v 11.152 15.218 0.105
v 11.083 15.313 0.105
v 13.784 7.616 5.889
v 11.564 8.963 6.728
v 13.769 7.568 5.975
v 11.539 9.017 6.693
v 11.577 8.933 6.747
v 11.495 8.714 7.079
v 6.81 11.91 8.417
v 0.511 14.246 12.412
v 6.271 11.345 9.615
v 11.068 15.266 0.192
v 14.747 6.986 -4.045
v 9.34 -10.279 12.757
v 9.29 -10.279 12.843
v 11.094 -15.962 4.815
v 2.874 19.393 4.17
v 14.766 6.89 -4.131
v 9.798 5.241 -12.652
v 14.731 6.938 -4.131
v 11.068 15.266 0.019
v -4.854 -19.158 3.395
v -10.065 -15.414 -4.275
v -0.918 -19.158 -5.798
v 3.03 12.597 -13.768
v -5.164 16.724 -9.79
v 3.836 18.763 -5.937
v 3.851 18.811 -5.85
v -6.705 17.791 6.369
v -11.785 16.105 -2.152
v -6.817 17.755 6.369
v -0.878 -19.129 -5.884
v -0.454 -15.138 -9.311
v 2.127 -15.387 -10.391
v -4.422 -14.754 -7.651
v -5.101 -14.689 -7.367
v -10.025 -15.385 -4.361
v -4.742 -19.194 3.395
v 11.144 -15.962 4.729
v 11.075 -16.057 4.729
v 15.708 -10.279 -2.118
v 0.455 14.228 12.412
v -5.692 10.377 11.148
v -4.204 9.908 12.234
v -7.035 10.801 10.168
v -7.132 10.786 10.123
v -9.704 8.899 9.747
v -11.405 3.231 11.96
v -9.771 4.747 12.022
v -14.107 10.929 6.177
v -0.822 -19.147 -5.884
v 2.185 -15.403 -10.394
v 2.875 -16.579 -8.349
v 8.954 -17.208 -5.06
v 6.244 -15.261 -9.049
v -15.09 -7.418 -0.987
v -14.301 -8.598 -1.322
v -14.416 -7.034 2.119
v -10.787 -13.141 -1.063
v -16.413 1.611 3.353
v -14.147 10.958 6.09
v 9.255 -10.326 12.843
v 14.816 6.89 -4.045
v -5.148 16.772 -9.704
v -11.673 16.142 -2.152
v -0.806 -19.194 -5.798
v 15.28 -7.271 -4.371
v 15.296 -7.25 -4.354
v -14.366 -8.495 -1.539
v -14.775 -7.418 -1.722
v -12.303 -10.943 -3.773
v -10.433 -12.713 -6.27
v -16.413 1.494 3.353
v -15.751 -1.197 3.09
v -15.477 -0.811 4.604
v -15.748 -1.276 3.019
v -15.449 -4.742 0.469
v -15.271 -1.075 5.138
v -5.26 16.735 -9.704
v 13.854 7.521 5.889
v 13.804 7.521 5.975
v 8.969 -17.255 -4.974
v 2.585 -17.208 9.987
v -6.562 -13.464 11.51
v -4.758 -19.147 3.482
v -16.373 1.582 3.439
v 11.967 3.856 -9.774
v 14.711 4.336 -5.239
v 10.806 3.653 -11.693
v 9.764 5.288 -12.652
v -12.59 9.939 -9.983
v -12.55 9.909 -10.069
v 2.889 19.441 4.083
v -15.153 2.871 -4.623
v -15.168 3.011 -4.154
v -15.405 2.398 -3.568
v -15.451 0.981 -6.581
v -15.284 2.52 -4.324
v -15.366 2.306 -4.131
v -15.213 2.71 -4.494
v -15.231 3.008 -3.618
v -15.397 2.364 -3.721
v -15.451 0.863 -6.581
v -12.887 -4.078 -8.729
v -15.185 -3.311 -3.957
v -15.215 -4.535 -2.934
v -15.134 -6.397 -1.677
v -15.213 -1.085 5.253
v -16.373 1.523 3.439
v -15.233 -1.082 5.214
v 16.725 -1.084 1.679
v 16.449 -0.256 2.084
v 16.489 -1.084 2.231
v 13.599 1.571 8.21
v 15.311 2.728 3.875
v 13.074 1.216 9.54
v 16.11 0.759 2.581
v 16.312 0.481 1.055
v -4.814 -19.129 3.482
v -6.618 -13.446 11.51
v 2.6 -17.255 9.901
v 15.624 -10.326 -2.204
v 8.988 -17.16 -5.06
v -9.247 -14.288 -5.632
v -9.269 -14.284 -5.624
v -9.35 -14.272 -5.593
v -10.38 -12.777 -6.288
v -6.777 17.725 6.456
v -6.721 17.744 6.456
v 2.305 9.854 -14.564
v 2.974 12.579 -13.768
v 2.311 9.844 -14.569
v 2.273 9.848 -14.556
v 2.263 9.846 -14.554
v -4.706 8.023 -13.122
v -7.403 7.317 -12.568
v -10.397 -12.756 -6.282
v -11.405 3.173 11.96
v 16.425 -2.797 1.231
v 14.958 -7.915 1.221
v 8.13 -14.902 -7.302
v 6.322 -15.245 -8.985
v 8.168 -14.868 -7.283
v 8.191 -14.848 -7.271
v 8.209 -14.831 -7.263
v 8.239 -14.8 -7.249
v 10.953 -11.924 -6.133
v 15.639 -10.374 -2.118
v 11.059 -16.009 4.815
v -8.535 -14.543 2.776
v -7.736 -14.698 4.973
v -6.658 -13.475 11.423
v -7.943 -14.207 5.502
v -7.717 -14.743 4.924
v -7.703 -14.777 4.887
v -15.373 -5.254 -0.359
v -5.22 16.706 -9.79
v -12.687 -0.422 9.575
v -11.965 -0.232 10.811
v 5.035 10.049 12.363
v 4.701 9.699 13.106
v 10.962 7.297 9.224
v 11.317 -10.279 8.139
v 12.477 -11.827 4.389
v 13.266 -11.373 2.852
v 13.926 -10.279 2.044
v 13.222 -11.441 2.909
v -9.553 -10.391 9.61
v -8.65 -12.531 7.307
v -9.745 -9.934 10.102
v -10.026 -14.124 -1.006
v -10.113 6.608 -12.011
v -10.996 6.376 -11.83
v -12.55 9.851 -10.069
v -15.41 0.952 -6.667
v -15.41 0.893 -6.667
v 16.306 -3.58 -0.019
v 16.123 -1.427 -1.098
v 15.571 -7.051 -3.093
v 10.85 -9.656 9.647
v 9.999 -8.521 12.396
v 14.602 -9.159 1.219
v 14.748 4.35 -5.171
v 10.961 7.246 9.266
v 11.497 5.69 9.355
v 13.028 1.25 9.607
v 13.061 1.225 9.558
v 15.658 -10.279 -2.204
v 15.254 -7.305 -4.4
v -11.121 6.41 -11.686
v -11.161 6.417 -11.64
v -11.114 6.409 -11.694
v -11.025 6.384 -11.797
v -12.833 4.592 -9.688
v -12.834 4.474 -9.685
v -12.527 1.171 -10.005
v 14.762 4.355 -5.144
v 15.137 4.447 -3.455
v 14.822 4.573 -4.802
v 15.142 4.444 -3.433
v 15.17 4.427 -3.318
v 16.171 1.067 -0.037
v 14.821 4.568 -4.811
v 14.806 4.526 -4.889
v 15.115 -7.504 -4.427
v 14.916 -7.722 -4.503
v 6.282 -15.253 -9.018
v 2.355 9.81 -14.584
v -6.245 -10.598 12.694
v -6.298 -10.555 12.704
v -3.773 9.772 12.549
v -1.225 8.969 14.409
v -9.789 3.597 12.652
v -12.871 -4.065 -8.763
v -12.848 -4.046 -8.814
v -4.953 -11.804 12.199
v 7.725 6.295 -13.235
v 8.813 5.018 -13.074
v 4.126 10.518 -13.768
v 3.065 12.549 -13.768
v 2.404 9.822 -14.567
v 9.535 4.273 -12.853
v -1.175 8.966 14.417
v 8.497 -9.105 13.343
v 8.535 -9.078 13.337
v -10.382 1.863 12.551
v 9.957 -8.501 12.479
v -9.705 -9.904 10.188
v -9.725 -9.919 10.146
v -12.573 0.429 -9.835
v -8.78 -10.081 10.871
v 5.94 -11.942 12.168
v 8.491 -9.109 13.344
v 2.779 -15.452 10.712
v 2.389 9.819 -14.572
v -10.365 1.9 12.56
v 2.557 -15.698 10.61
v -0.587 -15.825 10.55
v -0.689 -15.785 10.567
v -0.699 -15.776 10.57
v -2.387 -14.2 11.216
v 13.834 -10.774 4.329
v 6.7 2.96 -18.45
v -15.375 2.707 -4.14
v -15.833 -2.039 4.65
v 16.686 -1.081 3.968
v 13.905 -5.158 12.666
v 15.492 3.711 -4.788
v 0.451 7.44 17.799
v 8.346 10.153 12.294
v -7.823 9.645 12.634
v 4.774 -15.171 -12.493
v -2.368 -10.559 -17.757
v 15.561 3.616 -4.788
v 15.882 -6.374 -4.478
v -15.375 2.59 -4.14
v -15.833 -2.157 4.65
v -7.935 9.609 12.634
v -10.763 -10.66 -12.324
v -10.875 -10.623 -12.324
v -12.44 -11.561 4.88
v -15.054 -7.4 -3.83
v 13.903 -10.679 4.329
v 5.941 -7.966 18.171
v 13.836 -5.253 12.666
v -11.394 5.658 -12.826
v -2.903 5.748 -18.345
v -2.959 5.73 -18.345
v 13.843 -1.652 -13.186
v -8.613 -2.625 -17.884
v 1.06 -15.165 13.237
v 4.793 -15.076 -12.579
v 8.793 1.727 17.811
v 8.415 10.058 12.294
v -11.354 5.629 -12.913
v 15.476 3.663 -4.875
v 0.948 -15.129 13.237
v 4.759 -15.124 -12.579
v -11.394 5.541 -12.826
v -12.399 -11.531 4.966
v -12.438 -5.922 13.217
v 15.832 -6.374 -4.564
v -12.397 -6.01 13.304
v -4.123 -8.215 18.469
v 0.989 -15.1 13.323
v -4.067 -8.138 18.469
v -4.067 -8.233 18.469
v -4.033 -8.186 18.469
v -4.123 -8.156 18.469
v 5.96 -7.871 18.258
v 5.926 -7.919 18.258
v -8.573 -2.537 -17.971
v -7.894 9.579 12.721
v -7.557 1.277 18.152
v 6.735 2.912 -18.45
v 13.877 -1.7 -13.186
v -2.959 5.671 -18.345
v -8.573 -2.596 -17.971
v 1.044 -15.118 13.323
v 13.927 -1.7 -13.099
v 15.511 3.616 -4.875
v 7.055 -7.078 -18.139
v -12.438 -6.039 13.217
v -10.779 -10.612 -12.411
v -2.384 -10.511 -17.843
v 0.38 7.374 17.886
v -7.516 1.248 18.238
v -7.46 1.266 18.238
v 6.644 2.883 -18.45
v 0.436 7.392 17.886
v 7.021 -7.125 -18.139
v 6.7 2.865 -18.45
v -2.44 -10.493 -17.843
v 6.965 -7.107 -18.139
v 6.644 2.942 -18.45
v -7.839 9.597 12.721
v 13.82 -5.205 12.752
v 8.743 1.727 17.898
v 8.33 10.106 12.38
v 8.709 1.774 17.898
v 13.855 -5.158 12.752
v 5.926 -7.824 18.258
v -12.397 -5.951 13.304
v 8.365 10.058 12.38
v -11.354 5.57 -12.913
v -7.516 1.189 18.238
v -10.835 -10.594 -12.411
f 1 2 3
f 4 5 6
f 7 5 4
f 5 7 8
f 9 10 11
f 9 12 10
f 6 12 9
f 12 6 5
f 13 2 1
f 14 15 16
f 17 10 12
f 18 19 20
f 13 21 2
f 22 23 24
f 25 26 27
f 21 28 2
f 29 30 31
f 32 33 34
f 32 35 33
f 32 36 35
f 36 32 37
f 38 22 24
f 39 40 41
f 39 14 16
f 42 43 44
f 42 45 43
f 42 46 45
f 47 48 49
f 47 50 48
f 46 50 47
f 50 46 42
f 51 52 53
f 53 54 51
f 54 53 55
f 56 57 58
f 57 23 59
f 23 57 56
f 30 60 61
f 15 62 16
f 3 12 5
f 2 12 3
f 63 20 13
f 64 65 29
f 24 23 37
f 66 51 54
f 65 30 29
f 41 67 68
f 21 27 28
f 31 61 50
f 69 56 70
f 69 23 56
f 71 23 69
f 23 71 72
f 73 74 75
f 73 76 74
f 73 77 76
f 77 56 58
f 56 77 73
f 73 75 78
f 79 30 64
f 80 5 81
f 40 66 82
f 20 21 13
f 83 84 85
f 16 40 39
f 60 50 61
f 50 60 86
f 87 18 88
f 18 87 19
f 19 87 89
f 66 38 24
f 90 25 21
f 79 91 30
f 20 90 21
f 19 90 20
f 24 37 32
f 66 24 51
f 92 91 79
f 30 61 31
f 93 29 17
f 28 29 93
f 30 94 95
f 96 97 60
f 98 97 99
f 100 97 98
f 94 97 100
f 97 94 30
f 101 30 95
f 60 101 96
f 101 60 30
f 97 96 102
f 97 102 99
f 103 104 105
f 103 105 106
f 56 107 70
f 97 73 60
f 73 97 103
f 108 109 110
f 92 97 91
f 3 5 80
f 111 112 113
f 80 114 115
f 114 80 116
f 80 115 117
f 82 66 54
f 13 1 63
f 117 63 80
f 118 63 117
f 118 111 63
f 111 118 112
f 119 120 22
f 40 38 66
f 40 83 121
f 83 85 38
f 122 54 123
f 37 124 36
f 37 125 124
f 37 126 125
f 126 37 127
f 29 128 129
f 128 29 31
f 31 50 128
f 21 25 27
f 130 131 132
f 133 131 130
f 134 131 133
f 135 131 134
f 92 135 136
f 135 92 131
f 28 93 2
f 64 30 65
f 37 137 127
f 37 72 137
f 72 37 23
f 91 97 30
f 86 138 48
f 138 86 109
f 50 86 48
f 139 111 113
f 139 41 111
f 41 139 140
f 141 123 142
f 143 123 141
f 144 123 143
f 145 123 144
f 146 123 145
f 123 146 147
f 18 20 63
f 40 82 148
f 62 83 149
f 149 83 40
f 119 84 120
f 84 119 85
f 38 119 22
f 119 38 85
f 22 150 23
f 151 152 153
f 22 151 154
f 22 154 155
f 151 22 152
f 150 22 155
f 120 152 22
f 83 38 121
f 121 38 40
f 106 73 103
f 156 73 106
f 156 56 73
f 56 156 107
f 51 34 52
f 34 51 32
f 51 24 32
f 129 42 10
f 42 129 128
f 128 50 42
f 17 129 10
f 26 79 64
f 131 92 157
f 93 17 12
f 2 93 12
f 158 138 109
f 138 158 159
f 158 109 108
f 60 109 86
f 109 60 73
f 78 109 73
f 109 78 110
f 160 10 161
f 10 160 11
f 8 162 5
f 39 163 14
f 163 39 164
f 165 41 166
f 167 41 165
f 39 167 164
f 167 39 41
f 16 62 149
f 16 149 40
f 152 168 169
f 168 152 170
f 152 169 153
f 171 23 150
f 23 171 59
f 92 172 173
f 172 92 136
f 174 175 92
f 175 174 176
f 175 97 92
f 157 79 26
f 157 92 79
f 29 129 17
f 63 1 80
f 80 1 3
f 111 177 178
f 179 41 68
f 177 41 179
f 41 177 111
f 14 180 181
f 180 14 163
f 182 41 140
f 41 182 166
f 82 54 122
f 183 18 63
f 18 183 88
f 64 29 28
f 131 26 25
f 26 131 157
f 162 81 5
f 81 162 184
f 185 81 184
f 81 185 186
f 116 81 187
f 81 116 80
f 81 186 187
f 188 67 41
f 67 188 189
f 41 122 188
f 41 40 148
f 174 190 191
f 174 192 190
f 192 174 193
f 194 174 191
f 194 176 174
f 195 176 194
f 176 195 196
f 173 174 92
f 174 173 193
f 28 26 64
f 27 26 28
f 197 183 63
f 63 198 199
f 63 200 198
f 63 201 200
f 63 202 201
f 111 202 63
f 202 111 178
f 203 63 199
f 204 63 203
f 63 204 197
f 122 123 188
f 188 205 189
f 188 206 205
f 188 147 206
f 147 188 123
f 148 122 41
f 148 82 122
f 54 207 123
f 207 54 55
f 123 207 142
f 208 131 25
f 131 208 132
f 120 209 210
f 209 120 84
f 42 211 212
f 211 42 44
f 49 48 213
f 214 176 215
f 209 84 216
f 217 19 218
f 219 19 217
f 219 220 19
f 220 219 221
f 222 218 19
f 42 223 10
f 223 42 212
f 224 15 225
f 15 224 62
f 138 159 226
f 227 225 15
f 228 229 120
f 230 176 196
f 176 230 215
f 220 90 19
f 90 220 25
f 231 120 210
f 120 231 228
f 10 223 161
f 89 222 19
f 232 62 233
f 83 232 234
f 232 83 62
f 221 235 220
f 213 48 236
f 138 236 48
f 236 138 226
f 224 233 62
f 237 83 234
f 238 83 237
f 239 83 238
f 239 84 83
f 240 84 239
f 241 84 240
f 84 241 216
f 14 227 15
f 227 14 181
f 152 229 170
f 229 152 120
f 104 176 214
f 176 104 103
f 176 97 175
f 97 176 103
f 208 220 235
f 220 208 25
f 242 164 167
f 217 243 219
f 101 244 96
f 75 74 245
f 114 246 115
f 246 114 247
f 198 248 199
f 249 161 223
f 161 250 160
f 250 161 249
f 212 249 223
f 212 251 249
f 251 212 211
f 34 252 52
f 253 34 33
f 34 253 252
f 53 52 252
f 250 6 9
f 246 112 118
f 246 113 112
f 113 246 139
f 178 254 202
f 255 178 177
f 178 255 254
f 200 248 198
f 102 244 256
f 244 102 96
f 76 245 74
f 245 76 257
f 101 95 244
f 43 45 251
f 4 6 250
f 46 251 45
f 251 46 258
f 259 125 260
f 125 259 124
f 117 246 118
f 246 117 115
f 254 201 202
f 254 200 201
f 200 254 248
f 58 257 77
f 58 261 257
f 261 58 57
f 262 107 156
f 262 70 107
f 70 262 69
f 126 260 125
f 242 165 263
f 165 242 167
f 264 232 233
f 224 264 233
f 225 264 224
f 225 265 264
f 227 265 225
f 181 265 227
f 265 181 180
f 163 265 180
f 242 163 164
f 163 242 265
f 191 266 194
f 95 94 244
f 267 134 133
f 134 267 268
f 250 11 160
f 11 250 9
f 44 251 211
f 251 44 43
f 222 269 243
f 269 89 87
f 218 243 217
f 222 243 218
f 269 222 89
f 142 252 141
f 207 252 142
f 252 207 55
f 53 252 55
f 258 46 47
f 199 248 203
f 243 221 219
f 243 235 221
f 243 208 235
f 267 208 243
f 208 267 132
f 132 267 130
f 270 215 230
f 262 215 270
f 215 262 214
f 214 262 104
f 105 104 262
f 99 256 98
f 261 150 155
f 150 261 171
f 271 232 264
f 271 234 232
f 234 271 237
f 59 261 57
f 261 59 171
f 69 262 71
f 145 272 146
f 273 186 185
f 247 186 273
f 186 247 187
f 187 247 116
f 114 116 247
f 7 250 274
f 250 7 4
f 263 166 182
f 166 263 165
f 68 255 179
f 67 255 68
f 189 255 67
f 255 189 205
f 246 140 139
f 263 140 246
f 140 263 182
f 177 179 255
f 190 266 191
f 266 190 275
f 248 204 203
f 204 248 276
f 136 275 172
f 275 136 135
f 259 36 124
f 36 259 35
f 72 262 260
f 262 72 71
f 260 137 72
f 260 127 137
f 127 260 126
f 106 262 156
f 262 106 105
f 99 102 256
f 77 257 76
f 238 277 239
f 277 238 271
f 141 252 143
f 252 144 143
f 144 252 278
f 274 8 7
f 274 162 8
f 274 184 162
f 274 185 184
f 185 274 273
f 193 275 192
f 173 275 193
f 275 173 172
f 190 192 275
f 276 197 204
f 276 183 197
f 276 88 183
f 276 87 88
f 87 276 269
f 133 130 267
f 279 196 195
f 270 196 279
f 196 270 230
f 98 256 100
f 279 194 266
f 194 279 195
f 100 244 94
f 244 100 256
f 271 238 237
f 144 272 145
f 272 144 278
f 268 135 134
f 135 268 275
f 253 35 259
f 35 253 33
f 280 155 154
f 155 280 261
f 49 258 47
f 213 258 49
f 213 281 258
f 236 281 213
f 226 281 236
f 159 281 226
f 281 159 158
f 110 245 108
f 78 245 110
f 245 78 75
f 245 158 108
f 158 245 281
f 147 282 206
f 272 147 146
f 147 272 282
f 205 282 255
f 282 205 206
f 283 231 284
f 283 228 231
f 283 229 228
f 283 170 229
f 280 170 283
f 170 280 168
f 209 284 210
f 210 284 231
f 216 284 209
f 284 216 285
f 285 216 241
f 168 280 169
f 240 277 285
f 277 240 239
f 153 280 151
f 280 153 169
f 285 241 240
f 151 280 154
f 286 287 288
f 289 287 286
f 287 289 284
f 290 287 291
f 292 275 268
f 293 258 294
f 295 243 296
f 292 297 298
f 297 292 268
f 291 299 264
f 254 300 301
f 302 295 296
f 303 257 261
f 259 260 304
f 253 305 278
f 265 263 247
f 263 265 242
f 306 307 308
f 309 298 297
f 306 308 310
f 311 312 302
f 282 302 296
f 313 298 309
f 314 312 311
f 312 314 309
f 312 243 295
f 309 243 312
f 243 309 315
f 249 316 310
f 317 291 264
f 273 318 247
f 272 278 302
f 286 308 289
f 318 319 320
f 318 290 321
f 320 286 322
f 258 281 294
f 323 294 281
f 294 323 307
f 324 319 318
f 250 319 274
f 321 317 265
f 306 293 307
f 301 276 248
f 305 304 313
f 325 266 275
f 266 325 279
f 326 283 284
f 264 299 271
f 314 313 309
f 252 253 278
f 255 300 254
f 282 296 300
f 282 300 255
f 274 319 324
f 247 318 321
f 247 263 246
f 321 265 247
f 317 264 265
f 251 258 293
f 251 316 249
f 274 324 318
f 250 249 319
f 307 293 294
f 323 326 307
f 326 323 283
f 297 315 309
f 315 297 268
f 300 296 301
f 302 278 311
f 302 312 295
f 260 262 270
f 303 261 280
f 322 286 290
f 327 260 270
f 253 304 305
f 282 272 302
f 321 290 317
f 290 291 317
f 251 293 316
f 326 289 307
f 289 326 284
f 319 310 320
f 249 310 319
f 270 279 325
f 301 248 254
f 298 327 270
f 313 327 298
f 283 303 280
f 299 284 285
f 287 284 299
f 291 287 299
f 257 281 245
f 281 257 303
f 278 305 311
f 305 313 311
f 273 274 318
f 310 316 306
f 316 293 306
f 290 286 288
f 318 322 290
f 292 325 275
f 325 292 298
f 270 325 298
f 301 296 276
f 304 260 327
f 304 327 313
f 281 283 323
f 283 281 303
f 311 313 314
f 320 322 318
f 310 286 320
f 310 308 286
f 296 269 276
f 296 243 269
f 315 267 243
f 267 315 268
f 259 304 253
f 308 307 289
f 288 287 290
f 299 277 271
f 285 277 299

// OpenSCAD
// Auto-generated OpenSCAD file

    inner_points = 10*[[0.6684524443178234, 0.2912194859296234, -1.8363167690860016], [0.5910161587361856, -0.7871337989465796, 1.8171417764513753], [-0.2918345035641626, 0.5700386873175909, -1.8258845754108513], [0.7005256026010808, -0.7077839963284758, -1.8052788091992973], [0.8693085877915654, 0.17268677431141555, 1.78111690891311], [-0.4082680905441584, -0.8185618492857674, 1.8381956785148106], [-0.8532513180248714, -0.25664505176664254, -1.7883991652556823], [-0.2399390433352969, -1.0463829018555162, -1.7756641013727077], [0.04201851847921482, 0.7344604613470775, 1.7799062183976844], [-0.747567291966454, 0.12183512066246743, 1.8151828380475596], [-1.0794361675796518, -1.0564562485718862, -1.2323933529687556], [-0.785395180165941, 0.954977290682234, 1.26341914278561], [-1.1313316278085175, 0.5599653406012208, -1.2826138270068992], [0.4743407530463006, -1.5075951931337195, -1.2492729969123706], [0.8314806995920784, 1.005828944331182, 1.2293532136511605], [-1.2356817891893142, -0.598045019950611, 1.3217086029027356], [0.3903721345341776, 1.107829878297487, -1.3305314308372185], [1.3827322406994211, -0.1699928053485799, -1.3099256646256645], [1.3804783398490494, -0.5157653159624755, 1.266588771704851], [0.10290166151332539, -1.5070139395596582, 1.3236675413065515], [-0.9679627459509822, 1.0915308609299377, -0.45150089482603184], [1.0167574663795047, -1.4641145063621959, -0.41028936240292346], [1.3192715310196481, 0.8322870325903506, 0.3738163590127774], [-1.2358818256517996, -1.1502102146040154, 0.4879738982161779], [0.9327888478673815, 1.1513105650690107, -0.49154779632777174], [-1.4973064021284335, -0.7341563604123948, -0.38297752478415814], [1.546101122556956, 0.36157271498013704, -0.4788127324447971], [-0.8839941274388591, -1.5238942105012685, -0.3702424609011835], [-0.5073027875730468, 1.3626326692868251, 0.393659570560787], [-1.2968885980187155, 0.7500073286022151, 0.4289361902106621], [1.380278303386564, -1.0679305106158798, 0.43285406701829315], [0.5906924929408951, -1.6805558513004897, 0.46813068666816826], [-0.027498100014604697, 1.4301297664569783, -0.4811156026526214], [-1.5293795604116909, 0.2648471218457043, -0.4140154846708627], [1.5781742808402135, -0.6374307672779622, -0.44777477255809256], [0.07629282044312705, -1.8027134118892363, -0.38067465457633387], [0.49198146170729756, 1.3940607196260126, 0.3726056684973519], [-1.5751810270740951, -0.2098132446557805, 0.4649610577489272], [1.6585707324419436, -0.10810993735788438, 0.39682919948002804], [-0.40859175633944894, -1.7119839016396772, 0.48918458873160336]];

    outer_points = 10*[[1.104376346611005, -1.5961573617657159, 0.4728512902850581], [-0.673634048825412, 1.769605898412857, 0.6369190794461355], [0.893817731891513, -1.7160073529394246, -0.4973554141769706], [0.2569582435104783, -1.7160073529394246, 0.990073233123108], [0.2858087158543201, 1.9345652594329796, 0.40831901270173326], [-1.1703713108325864, 1.6046465373927346, -0.21516102344645555], [-0.08373275172975375, -1.9099287122098603, -0.5797541908094787], [-0.4773335616071019, -1.9099287122098603, 0.3395272690622494], [0.3820396926793872, 1.8715563902857573, -0.585043701269393], [-0.5179290575518498, 1.667655406539957, -0.9703755549159867], [-0.9984278133317204, -1.5355652274301959, -0.42748822105720446], [0.3014721351224021, 1.2549195998361895, -1.3681579568754045], [0.3727234801668946, -1.3416438681597602, -1.2643709042964242], [-0.6577368180914882, -1.3416438681597602, 1.1423392028753823], [1.1052099085285718, 1.5218294527292122, 0.010536610742315433], [-1.2509388683895712, 0.9880097469431668, -0.9982752790524669], [1.5608325785076533, -1.0278725177156156, -0.21176542320188751], [0.9239730901266188, -1.0278725177156156, 1.275663224098191], [0.04953616702377289, 1.419878960856312, 1.2324993914578442], [-1.4066438596631334, 1.089960238816067, 0.6090193553096552], [0.7176843678750273, -0.42213967519526474, -1.452822556112823], [-0.556034608887042, -0.42213967519526474, 1.5220347384873343], [1.3753551471929137, 0.7520583972355097, 0.5888739449609331], [-1.537004906180899, 0.09222095315501971, -0.6580861273354446], [1.6625347877120995, -0.10836832475112018, 0.1679301124100645], [-1.1072842188467662, -0.7359110256394092, -1.0179993899072812], [1.2689339778347515, -0.10836832475112018, 1.0872115722817925], [-1.5008850287241142, -0.7359110256394092, -0.09871793003555307], [0.9748488620108067, 0.524090167068165, -1.2565688719027843], [0.07488011177956955, 0.3201891833223645, -1.641900725549378], [-0.23652987076755477, 0.524090167068165, 1.5726885431748667], [-1.136498620998792, 0.3201891833223645, 1.187356689528273], [1.4519761729926075, -0.228218315924829, -0.8022765920519641], [-0.2598661157462394, -0.6160610344657005, -1.5352213327453308], [0.4215158747342246, -0.228218315924829, 1.6044335151198423], [-1.2903264140046222, -0.6160610344657005, 0.8714887744264755], [1.4715861240179806, 0.6890495280882876, -0.4044887690101932], [-0.8845626529001624, 0.15522982230224197, -1.4133006588049757], [0.7229128939121772, 0.6890495280882876, 1.3440884764304641], [-1.633235883005966, 0.15522982230224197, 0.3352765866356817]];

    // Convex hull for inner set (I)
    module inner_hull() {
        hull() {
            for (p = inner_points) {
                translate(p) sphere(r=0.1);
            }
        }
    }

    // Convex hull for outer set (O) minus inner hull (O \ I)
    module outer_minus_inner() {
        difference() {
            hull() {
                for (p = outer_points) {
                    translate(p) sphere(r=0.1);
                }
            }
            inner_hull(); // Subtract inner hull
        }
    }

    // Convex hull for outer set (O) minus all translated inner hulls
    module outer_minus_AllTranslationInner() {
        difference() {
            hull() {
                for (p = outer_points) {
                    translate(p) sphere(r=0.1);
                }
            }
            hull() {
                translate([0,0,50]) inner_hull();
                translate([0,0,-50]) inner_hull();
            }; // Subtract translated inner hulls
        }
    }

    // Difference between outer_minus_inner and outer_minus_AllTranslationInner
    module outer_minus_inner_diff() {
        difference() {
            // Outer minus inner
            difference() {
                hull() {
                    for (p = outer_points) {
                        translate(p) sphere(r=0.1);
                    }
                }
                inner_hull();
            }

            // Subtract Outer minus AllTranslationInner
            difference() {
                hull() {
                    for (p = outer_points) {
                        translate(p) sphere(r=0.1);
                    }
                }
                hull() {
                    translate([0,0,50]) inner_hull();
                    translate([0,0,-50]) inner_hull();
                };
            }
        }
    }

    // Rendering all with colors applied
    color([1, 0, 0, 0.5]) inner_hull(); // Transparent red
    color([0, 1, 0, 1]) outer_minus_AllTranslationInner(); // Opaque green
    color([1, 1, 0, 1]) outer_minus_inner_diff(); // Opaque yellow
    
